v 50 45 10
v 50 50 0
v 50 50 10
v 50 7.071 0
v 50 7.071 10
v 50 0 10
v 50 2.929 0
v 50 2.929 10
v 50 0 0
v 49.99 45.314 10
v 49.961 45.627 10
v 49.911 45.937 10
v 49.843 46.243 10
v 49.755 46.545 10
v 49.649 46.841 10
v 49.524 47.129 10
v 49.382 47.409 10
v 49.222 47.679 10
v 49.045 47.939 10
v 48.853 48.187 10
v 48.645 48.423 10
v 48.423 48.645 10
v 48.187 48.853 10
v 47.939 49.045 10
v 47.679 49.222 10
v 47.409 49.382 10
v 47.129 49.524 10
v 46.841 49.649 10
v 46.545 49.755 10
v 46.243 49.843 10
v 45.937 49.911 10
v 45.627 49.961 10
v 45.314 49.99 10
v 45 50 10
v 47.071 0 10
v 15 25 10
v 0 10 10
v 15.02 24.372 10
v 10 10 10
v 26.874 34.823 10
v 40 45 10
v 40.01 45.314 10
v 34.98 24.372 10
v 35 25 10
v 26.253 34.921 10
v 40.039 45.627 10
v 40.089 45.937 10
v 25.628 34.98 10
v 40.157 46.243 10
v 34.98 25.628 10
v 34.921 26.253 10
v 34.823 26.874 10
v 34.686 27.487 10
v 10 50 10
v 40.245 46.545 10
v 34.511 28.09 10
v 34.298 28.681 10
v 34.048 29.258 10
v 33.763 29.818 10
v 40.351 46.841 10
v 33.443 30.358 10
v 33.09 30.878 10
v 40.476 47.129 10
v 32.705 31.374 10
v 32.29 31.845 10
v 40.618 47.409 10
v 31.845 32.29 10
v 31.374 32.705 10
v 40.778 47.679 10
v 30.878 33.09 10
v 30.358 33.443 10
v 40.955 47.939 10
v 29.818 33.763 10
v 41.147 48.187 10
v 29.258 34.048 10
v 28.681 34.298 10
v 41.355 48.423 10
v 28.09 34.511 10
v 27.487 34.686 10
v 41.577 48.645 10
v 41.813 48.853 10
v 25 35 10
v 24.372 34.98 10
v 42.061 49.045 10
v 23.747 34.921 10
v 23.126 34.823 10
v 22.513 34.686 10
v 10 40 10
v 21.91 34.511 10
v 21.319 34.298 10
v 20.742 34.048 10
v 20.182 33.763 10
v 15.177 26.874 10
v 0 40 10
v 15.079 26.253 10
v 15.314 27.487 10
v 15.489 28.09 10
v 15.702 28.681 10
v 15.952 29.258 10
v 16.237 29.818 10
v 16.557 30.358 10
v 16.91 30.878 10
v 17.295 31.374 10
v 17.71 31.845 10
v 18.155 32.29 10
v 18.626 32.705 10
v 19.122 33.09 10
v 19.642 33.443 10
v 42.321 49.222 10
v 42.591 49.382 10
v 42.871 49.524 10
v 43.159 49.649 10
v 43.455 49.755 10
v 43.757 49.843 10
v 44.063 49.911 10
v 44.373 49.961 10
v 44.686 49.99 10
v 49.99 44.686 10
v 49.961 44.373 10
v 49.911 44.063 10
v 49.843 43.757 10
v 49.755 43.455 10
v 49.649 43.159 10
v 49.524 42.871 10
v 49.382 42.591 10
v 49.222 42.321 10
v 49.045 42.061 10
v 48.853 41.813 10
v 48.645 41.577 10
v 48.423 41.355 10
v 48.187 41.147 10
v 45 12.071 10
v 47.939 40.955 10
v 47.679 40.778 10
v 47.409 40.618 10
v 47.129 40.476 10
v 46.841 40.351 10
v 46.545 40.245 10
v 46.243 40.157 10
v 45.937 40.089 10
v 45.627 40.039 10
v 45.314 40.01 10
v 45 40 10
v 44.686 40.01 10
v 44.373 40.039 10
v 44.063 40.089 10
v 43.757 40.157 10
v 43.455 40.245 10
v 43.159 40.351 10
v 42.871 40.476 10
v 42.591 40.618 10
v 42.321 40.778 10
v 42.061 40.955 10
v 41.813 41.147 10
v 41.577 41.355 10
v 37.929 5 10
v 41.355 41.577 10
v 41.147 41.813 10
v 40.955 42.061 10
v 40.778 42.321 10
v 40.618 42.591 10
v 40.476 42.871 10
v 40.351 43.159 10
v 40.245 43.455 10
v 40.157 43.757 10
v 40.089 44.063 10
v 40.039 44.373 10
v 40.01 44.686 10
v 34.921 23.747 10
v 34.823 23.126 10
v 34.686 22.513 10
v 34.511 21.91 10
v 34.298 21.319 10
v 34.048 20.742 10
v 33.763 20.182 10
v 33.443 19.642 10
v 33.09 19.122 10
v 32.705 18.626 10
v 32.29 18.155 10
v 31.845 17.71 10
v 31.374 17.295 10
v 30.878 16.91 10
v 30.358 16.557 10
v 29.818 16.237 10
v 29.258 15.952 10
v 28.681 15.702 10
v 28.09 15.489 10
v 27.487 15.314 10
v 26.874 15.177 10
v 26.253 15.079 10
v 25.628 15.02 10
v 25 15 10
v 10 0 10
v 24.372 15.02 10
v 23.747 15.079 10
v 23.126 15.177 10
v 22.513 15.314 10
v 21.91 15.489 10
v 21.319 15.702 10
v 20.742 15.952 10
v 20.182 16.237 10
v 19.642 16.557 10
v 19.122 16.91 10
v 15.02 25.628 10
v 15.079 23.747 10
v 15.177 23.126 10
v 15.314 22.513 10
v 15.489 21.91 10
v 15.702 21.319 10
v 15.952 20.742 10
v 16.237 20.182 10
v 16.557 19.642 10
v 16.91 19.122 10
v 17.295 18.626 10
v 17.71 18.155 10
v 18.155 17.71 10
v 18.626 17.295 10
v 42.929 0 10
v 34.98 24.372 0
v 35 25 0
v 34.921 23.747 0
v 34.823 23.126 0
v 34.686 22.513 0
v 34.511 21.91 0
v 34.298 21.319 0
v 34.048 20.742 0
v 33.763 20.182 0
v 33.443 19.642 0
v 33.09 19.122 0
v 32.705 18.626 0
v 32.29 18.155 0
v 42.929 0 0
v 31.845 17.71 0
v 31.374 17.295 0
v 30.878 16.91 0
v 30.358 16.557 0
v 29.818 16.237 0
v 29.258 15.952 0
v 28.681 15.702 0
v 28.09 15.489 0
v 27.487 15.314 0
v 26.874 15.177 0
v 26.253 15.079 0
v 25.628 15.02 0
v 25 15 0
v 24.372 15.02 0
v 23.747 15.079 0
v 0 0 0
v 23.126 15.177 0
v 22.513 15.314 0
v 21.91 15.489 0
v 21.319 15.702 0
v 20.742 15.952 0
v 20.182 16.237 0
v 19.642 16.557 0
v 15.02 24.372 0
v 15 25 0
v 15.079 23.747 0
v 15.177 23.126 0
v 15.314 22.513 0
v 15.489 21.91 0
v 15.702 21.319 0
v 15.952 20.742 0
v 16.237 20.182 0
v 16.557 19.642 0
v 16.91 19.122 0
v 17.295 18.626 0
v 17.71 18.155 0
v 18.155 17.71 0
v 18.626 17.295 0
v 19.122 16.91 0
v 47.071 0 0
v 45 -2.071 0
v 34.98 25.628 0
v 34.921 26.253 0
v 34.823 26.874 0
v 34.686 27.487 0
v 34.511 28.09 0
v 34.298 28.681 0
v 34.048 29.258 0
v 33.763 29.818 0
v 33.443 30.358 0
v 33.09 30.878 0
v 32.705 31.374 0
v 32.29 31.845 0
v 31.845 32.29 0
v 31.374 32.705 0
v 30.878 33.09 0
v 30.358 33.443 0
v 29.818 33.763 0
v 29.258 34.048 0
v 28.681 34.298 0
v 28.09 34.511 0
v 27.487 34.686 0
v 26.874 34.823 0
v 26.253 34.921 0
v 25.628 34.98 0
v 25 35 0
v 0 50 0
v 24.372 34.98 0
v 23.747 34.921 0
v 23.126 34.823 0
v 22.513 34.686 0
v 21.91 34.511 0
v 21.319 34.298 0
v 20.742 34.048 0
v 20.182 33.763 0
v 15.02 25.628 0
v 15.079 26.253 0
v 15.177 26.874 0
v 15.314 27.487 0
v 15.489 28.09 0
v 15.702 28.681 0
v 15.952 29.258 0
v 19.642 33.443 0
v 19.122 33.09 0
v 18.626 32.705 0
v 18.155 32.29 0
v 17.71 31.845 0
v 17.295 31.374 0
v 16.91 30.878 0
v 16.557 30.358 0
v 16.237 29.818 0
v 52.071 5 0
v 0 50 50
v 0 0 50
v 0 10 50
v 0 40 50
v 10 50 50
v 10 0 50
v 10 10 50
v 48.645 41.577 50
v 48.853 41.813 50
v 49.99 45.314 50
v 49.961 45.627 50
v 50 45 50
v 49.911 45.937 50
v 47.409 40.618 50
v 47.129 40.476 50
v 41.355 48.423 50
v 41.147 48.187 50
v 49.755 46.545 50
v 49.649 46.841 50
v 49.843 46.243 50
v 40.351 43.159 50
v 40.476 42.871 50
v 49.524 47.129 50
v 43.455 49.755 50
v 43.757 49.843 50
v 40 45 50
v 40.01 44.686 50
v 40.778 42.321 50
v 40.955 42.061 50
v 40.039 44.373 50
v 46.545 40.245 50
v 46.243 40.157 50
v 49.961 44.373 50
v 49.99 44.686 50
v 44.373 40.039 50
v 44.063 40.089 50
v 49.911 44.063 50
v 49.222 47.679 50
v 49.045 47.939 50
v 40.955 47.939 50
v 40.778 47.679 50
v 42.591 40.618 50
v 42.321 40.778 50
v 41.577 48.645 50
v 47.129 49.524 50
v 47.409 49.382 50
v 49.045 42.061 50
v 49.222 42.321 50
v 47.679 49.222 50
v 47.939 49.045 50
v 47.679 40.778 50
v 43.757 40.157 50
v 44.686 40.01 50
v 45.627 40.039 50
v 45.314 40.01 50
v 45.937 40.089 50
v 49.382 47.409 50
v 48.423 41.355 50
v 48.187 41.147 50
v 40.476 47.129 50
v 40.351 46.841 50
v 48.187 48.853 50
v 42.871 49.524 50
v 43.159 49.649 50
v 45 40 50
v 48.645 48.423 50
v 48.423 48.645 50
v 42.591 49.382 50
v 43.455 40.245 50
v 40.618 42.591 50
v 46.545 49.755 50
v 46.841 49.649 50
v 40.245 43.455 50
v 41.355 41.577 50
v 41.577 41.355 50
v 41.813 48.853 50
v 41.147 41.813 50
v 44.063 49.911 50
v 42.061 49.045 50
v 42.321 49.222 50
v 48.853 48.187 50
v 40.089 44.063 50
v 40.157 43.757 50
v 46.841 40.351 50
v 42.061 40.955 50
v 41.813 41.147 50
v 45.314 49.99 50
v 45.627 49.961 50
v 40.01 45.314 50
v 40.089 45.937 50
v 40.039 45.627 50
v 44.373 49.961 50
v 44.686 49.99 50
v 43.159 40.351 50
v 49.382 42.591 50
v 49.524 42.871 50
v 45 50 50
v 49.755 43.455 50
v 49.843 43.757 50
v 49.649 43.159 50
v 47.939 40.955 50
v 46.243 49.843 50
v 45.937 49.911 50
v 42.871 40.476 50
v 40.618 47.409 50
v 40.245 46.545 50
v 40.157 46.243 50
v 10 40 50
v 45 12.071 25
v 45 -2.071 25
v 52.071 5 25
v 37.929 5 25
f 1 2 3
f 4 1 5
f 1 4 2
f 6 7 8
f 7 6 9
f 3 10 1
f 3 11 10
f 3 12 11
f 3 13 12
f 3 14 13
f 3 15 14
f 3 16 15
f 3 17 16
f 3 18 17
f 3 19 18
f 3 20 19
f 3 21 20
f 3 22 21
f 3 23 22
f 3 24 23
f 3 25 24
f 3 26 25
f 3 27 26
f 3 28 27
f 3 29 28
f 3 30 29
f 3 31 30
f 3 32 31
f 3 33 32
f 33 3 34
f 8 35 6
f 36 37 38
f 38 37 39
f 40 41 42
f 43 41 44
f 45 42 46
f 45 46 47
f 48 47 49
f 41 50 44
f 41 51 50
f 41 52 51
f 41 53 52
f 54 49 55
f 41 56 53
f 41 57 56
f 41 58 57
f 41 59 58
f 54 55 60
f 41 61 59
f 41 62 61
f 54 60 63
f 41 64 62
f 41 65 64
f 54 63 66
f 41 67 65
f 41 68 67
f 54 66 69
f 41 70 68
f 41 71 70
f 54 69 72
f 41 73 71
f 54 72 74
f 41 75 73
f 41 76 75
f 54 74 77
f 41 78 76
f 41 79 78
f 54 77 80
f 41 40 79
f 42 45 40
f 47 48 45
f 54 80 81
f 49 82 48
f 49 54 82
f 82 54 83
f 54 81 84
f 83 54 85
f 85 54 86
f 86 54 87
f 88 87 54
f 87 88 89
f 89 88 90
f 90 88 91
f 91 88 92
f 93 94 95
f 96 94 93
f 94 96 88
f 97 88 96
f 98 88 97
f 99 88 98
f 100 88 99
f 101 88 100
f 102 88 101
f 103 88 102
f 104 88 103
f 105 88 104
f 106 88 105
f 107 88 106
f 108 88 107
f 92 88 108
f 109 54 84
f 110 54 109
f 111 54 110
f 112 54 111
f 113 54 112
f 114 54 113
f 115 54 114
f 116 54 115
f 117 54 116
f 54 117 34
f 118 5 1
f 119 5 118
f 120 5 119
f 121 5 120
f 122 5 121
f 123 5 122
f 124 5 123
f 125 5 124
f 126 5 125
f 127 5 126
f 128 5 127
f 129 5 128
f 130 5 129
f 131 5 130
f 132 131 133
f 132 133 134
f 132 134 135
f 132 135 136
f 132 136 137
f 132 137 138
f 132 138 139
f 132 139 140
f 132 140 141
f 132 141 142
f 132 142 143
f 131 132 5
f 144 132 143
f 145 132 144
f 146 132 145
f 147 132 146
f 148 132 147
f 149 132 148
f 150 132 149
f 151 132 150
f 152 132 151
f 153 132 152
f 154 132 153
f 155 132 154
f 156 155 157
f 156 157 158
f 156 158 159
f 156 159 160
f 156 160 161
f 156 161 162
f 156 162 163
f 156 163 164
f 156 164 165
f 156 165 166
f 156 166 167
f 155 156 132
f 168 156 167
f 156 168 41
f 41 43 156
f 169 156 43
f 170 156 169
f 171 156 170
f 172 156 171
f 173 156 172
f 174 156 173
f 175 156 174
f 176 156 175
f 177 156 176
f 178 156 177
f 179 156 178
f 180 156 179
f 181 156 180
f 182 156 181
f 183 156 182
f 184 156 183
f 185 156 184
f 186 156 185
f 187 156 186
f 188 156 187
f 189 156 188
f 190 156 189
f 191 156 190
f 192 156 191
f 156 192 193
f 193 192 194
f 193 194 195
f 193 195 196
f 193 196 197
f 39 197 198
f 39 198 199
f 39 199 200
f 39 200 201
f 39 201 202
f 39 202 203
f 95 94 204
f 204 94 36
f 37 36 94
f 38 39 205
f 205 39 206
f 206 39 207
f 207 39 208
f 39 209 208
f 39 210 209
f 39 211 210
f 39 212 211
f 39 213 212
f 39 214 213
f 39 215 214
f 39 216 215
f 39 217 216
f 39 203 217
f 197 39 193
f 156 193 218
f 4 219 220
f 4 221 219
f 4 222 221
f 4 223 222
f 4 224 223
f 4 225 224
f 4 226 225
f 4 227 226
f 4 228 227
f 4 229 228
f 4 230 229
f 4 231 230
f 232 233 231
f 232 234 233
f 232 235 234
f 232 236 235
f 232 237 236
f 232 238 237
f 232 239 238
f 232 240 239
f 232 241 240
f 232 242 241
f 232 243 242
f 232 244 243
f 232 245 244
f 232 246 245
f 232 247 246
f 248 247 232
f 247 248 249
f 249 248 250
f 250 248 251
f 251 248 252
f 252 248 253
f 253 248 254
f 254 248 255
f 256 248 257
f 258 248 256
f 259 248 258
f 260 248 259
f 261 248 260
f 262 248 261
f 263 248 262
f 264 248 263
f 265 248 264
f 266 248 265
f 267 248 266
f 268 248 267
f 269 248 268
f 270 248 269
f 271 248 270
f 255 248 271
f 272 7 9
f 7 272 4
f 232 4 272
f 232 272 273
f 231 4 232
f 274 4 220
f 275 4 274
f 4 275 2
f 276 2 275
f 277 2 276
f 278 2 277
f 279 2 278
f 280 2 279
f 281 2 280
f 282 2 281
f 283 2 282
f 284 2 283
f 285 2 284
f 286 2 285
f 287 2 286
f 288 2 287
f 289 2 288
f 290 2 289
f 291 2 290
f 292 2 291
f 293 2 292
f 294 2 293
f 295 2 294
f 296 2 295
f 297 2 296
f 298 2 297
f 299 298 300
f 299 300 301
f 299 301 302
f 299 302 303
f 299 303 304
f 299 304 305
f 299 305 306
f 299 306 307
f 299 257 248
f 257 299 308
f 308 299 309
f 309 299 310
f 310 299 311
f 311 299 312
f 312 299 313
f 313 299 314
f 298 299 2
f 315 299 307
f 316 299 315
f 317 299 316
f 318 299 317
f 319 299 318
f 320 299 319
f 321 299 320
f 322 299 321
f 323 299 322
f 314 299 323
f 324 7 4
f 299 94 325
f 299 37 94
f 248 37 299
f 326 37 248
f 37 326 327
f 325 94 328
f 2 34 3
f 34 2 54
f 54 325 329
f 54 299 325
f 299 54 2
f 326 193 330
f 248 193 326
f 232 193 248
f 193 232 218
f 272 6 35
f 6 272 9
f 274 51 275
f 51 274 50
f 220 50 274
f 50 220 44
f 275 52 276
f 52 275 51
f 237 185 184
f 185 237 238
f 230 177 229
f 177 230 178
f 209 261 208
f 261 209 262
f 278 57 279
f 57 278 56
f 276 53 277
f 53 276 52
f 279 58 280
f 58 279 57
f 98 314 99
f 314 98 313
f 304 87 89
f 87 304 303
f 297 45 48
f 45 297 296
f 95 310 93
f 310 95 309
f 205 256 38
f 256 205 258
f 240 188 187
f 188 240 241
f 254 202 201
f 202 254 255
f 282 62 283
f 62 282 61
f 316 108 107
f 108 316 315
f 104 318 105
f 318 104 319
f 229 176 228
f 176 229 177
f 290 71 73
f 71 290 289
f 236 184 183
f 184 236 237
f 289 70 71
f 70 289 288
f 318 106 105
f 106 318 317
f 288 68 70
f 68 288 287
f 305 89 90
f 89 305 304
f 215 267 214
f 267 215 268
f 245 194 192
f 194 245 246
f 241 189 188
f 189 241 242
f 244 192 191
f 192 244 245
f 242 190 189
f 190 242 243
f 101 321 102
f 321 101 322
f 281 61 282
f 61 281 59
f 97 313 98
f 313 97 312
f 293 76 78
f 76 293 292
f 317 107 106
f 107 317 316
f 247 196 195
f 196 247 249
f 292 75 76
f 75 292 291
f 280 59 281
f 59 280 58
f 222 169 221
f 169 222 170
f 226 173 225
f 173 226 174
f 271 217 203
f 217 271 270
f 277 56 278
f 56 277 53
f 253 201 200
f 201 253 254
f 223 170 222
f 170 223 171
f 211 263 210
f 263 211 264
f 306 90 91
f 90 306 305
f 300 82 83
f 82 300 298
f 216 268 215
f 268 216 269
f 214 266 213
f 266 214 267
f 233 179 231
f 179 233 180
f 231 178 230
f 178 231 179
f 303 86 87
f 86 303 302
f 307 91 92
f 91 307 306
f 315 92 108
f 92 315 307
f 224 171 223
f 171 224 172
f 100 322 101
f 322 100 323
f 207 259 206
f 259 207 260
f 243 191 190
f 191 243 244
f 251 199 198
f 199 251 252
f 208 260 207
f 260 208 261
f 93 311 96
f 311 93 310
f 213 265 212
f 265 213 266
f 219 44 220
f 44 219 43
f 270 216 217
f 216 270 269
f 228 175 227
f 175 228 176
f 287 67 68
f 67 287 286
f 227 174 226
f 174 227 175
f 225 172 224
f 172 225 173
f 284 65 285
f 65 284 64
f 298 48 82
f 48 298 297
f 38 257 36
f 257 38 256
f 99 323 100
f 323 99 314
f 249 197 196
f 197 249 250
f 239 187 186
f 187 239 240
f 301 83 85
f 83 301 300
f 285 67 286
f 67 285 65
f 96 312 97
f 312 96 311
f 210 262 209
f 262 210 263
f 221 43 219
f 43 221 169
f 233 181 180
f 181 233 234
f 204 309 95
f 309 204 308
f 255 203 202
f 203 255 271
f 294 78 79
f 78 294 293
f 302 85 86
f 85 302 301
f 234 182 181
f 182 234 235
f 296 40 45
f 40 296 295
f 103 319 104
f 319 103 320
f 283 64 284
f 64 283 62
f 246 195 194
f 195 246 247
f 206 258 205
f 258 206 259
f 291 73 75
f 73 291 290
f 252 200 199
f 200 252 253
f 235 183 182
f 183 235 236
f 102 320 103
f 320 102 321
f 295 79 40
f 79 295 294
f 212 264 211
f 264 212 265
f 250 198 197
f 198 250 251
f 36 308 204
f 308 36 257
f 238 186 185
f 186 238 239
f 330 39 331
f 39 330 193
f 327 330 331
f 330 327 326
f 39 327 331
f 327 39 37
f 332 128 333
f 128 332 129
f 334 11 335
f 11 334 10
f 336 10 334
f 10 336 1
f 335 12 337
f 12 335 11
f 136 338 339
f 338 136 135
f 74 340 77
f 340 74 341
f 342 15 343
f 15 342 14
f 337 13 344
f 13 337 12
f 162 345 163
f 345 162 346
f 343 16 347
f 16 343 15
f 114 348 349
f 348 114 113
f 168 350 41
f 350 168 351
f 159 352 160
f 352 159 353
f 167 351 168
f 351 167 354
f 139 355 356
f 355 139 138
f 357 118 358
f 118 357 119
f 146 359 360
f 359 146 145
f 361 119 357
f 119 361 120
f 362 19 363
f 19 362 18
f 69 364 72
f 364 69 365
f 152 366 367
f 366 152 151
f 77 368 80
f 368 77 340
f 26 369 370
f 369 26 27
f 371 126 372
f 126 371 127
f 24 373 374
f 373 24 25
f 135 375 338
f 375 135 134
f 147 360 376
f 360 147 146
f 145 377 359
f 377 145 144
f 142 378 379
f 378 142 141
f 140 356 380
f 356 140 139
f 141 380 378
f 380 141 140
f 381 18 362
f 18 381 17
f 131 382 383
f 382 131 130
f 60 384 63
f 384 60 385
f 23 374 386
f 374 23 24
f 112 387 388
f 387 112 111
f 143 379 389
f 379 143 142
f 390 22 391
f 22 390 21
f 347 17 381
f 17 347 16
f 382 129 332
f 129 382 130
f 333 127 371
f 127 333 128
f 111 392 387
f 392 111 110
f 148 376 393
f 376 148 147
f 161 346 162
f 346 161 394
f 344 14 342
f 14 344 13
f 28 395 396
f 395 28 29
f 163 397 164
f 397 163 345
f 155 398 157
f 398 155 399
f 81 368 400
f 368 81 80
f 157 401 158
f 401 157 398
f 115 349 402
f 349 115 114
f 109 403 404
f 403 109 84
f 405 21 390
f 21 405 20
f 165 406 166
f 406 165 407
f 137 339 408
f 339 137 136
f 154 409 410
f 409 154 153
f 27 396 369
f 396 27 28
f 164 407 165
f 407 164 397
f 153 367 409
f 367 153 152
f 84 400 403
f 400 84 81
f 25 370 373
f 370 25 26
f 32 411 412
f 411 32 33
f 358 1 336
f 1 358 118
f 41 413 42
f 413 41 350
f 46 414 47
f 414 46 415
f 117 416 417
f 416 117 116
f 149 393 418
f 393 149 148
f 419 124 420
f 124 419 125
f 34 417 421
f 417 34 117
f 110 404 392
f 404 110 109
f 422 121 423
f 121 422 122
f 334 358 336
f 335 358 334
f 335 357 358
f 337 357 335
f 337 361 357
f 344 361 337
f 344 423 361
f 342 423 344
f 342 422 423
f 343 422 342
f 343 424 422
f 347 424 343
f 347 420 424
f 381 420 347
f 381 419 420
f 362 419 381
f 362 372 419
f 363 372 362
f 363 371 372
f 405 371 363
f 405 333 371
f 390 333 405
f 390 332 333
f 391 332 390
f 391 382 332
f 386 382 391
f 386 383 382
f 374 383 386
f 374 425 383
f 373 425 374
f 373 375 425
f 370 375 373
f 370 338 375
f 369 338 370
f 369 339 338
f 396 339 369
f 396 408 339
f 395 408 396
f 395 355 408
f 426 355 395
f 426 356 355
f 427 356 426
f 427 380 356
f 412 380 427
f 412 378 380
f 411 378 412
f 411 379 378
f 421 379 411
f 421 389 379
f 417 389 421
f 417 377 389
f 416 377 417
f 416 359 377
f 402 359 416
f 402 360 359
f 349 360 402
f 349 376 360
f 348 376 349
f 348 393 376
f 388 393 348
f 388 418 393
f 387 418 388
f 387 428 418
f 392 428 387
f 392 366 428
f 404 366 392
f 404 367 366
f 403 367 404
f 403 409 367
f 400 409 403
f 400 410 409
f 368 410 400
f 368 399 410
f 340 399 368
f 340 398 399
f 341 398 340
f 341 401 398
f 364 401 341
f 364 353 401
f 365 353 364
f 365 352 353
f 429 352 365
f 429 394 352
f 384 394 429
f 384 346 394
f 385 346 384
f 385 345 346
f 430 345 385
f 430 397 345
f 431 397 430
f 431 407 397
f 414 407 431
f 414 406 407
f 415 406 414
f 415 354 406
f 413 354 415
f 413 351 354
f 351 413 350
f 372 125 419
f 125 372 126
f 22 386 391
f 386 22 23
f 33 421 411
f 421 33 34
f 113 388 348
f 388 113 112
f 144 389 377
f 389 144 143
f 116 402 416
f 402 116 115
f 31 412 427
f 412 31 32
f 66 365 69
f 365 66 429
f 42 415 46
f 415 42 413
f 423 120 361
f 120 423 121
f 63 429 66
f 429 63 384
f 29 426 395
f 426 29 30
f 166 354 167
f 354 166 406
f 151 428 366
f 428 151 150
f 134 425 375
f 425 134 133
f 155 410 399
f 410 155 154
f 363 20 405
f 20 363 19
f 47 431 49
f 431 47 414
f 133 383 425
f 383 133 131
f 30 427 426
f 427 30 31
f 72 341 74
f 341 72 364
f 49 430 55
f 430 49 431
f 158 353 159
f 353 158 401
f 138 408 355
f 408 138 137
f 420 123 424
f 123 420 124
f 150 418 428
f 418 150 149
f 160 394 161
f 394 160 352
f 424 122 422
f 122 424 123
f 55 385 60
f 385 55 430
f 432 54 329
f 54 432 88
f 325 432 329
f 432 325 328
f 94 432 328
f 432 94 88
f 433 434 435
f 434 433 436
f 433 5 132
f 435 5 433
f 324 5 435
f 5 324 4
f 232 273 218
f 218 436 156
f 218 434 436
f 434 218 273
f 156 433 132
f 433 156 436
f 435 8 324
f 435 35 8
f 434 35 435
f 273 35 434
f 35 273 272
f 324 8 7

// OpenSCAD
edge = 50;
pillars= 10;


difference () {
cube(
    [edge,
    edge,
    pillars,
    ],
    center=false);
    
    
color("blue") {
translate( v = [edge/2, edge /2, -edge/2] ) {
cylinder(
r=pillars,
h=edge,
center=false,
$fn=100);
}
}
}
    
cube(
    [pillars,
    pillars,
    edge,
    ],
    center=false);
    
translate( v = [edge - pillars, edge - pillars, 0] ) {
translate( v = [pillars/2,pillars/2,0] ) {
    cylinder(
    r=pillars/2,
    h=edge,
    center=false,
    $fn=100);
}
}

translate( v = [0, edge - pillars, 0] ) {
    cube(
    [pillars,
    pillars,
    edge,
    ],
    center=false);
}

translate( v = [edge - pillars, 0, 0] ) {
translate([pillars/2, pillars/2, 0]) {
rotate([0, 0, 45]) {
translate([-pillars/2, -pillars/2, 0]) {
    cube(
        [pillars,
        pillars,
        edge*0.5,
        ],
        center=false);
}
}
}
}

translate( v = [edge - pillars, edge - pillars, 0] ) {
    translate( v = [pillars/2,pillars/2,0] ) {
        cylinder(
            r=pillars/2,
            h=edge,
            center=false,
            $fn=100
        );
    }
}
